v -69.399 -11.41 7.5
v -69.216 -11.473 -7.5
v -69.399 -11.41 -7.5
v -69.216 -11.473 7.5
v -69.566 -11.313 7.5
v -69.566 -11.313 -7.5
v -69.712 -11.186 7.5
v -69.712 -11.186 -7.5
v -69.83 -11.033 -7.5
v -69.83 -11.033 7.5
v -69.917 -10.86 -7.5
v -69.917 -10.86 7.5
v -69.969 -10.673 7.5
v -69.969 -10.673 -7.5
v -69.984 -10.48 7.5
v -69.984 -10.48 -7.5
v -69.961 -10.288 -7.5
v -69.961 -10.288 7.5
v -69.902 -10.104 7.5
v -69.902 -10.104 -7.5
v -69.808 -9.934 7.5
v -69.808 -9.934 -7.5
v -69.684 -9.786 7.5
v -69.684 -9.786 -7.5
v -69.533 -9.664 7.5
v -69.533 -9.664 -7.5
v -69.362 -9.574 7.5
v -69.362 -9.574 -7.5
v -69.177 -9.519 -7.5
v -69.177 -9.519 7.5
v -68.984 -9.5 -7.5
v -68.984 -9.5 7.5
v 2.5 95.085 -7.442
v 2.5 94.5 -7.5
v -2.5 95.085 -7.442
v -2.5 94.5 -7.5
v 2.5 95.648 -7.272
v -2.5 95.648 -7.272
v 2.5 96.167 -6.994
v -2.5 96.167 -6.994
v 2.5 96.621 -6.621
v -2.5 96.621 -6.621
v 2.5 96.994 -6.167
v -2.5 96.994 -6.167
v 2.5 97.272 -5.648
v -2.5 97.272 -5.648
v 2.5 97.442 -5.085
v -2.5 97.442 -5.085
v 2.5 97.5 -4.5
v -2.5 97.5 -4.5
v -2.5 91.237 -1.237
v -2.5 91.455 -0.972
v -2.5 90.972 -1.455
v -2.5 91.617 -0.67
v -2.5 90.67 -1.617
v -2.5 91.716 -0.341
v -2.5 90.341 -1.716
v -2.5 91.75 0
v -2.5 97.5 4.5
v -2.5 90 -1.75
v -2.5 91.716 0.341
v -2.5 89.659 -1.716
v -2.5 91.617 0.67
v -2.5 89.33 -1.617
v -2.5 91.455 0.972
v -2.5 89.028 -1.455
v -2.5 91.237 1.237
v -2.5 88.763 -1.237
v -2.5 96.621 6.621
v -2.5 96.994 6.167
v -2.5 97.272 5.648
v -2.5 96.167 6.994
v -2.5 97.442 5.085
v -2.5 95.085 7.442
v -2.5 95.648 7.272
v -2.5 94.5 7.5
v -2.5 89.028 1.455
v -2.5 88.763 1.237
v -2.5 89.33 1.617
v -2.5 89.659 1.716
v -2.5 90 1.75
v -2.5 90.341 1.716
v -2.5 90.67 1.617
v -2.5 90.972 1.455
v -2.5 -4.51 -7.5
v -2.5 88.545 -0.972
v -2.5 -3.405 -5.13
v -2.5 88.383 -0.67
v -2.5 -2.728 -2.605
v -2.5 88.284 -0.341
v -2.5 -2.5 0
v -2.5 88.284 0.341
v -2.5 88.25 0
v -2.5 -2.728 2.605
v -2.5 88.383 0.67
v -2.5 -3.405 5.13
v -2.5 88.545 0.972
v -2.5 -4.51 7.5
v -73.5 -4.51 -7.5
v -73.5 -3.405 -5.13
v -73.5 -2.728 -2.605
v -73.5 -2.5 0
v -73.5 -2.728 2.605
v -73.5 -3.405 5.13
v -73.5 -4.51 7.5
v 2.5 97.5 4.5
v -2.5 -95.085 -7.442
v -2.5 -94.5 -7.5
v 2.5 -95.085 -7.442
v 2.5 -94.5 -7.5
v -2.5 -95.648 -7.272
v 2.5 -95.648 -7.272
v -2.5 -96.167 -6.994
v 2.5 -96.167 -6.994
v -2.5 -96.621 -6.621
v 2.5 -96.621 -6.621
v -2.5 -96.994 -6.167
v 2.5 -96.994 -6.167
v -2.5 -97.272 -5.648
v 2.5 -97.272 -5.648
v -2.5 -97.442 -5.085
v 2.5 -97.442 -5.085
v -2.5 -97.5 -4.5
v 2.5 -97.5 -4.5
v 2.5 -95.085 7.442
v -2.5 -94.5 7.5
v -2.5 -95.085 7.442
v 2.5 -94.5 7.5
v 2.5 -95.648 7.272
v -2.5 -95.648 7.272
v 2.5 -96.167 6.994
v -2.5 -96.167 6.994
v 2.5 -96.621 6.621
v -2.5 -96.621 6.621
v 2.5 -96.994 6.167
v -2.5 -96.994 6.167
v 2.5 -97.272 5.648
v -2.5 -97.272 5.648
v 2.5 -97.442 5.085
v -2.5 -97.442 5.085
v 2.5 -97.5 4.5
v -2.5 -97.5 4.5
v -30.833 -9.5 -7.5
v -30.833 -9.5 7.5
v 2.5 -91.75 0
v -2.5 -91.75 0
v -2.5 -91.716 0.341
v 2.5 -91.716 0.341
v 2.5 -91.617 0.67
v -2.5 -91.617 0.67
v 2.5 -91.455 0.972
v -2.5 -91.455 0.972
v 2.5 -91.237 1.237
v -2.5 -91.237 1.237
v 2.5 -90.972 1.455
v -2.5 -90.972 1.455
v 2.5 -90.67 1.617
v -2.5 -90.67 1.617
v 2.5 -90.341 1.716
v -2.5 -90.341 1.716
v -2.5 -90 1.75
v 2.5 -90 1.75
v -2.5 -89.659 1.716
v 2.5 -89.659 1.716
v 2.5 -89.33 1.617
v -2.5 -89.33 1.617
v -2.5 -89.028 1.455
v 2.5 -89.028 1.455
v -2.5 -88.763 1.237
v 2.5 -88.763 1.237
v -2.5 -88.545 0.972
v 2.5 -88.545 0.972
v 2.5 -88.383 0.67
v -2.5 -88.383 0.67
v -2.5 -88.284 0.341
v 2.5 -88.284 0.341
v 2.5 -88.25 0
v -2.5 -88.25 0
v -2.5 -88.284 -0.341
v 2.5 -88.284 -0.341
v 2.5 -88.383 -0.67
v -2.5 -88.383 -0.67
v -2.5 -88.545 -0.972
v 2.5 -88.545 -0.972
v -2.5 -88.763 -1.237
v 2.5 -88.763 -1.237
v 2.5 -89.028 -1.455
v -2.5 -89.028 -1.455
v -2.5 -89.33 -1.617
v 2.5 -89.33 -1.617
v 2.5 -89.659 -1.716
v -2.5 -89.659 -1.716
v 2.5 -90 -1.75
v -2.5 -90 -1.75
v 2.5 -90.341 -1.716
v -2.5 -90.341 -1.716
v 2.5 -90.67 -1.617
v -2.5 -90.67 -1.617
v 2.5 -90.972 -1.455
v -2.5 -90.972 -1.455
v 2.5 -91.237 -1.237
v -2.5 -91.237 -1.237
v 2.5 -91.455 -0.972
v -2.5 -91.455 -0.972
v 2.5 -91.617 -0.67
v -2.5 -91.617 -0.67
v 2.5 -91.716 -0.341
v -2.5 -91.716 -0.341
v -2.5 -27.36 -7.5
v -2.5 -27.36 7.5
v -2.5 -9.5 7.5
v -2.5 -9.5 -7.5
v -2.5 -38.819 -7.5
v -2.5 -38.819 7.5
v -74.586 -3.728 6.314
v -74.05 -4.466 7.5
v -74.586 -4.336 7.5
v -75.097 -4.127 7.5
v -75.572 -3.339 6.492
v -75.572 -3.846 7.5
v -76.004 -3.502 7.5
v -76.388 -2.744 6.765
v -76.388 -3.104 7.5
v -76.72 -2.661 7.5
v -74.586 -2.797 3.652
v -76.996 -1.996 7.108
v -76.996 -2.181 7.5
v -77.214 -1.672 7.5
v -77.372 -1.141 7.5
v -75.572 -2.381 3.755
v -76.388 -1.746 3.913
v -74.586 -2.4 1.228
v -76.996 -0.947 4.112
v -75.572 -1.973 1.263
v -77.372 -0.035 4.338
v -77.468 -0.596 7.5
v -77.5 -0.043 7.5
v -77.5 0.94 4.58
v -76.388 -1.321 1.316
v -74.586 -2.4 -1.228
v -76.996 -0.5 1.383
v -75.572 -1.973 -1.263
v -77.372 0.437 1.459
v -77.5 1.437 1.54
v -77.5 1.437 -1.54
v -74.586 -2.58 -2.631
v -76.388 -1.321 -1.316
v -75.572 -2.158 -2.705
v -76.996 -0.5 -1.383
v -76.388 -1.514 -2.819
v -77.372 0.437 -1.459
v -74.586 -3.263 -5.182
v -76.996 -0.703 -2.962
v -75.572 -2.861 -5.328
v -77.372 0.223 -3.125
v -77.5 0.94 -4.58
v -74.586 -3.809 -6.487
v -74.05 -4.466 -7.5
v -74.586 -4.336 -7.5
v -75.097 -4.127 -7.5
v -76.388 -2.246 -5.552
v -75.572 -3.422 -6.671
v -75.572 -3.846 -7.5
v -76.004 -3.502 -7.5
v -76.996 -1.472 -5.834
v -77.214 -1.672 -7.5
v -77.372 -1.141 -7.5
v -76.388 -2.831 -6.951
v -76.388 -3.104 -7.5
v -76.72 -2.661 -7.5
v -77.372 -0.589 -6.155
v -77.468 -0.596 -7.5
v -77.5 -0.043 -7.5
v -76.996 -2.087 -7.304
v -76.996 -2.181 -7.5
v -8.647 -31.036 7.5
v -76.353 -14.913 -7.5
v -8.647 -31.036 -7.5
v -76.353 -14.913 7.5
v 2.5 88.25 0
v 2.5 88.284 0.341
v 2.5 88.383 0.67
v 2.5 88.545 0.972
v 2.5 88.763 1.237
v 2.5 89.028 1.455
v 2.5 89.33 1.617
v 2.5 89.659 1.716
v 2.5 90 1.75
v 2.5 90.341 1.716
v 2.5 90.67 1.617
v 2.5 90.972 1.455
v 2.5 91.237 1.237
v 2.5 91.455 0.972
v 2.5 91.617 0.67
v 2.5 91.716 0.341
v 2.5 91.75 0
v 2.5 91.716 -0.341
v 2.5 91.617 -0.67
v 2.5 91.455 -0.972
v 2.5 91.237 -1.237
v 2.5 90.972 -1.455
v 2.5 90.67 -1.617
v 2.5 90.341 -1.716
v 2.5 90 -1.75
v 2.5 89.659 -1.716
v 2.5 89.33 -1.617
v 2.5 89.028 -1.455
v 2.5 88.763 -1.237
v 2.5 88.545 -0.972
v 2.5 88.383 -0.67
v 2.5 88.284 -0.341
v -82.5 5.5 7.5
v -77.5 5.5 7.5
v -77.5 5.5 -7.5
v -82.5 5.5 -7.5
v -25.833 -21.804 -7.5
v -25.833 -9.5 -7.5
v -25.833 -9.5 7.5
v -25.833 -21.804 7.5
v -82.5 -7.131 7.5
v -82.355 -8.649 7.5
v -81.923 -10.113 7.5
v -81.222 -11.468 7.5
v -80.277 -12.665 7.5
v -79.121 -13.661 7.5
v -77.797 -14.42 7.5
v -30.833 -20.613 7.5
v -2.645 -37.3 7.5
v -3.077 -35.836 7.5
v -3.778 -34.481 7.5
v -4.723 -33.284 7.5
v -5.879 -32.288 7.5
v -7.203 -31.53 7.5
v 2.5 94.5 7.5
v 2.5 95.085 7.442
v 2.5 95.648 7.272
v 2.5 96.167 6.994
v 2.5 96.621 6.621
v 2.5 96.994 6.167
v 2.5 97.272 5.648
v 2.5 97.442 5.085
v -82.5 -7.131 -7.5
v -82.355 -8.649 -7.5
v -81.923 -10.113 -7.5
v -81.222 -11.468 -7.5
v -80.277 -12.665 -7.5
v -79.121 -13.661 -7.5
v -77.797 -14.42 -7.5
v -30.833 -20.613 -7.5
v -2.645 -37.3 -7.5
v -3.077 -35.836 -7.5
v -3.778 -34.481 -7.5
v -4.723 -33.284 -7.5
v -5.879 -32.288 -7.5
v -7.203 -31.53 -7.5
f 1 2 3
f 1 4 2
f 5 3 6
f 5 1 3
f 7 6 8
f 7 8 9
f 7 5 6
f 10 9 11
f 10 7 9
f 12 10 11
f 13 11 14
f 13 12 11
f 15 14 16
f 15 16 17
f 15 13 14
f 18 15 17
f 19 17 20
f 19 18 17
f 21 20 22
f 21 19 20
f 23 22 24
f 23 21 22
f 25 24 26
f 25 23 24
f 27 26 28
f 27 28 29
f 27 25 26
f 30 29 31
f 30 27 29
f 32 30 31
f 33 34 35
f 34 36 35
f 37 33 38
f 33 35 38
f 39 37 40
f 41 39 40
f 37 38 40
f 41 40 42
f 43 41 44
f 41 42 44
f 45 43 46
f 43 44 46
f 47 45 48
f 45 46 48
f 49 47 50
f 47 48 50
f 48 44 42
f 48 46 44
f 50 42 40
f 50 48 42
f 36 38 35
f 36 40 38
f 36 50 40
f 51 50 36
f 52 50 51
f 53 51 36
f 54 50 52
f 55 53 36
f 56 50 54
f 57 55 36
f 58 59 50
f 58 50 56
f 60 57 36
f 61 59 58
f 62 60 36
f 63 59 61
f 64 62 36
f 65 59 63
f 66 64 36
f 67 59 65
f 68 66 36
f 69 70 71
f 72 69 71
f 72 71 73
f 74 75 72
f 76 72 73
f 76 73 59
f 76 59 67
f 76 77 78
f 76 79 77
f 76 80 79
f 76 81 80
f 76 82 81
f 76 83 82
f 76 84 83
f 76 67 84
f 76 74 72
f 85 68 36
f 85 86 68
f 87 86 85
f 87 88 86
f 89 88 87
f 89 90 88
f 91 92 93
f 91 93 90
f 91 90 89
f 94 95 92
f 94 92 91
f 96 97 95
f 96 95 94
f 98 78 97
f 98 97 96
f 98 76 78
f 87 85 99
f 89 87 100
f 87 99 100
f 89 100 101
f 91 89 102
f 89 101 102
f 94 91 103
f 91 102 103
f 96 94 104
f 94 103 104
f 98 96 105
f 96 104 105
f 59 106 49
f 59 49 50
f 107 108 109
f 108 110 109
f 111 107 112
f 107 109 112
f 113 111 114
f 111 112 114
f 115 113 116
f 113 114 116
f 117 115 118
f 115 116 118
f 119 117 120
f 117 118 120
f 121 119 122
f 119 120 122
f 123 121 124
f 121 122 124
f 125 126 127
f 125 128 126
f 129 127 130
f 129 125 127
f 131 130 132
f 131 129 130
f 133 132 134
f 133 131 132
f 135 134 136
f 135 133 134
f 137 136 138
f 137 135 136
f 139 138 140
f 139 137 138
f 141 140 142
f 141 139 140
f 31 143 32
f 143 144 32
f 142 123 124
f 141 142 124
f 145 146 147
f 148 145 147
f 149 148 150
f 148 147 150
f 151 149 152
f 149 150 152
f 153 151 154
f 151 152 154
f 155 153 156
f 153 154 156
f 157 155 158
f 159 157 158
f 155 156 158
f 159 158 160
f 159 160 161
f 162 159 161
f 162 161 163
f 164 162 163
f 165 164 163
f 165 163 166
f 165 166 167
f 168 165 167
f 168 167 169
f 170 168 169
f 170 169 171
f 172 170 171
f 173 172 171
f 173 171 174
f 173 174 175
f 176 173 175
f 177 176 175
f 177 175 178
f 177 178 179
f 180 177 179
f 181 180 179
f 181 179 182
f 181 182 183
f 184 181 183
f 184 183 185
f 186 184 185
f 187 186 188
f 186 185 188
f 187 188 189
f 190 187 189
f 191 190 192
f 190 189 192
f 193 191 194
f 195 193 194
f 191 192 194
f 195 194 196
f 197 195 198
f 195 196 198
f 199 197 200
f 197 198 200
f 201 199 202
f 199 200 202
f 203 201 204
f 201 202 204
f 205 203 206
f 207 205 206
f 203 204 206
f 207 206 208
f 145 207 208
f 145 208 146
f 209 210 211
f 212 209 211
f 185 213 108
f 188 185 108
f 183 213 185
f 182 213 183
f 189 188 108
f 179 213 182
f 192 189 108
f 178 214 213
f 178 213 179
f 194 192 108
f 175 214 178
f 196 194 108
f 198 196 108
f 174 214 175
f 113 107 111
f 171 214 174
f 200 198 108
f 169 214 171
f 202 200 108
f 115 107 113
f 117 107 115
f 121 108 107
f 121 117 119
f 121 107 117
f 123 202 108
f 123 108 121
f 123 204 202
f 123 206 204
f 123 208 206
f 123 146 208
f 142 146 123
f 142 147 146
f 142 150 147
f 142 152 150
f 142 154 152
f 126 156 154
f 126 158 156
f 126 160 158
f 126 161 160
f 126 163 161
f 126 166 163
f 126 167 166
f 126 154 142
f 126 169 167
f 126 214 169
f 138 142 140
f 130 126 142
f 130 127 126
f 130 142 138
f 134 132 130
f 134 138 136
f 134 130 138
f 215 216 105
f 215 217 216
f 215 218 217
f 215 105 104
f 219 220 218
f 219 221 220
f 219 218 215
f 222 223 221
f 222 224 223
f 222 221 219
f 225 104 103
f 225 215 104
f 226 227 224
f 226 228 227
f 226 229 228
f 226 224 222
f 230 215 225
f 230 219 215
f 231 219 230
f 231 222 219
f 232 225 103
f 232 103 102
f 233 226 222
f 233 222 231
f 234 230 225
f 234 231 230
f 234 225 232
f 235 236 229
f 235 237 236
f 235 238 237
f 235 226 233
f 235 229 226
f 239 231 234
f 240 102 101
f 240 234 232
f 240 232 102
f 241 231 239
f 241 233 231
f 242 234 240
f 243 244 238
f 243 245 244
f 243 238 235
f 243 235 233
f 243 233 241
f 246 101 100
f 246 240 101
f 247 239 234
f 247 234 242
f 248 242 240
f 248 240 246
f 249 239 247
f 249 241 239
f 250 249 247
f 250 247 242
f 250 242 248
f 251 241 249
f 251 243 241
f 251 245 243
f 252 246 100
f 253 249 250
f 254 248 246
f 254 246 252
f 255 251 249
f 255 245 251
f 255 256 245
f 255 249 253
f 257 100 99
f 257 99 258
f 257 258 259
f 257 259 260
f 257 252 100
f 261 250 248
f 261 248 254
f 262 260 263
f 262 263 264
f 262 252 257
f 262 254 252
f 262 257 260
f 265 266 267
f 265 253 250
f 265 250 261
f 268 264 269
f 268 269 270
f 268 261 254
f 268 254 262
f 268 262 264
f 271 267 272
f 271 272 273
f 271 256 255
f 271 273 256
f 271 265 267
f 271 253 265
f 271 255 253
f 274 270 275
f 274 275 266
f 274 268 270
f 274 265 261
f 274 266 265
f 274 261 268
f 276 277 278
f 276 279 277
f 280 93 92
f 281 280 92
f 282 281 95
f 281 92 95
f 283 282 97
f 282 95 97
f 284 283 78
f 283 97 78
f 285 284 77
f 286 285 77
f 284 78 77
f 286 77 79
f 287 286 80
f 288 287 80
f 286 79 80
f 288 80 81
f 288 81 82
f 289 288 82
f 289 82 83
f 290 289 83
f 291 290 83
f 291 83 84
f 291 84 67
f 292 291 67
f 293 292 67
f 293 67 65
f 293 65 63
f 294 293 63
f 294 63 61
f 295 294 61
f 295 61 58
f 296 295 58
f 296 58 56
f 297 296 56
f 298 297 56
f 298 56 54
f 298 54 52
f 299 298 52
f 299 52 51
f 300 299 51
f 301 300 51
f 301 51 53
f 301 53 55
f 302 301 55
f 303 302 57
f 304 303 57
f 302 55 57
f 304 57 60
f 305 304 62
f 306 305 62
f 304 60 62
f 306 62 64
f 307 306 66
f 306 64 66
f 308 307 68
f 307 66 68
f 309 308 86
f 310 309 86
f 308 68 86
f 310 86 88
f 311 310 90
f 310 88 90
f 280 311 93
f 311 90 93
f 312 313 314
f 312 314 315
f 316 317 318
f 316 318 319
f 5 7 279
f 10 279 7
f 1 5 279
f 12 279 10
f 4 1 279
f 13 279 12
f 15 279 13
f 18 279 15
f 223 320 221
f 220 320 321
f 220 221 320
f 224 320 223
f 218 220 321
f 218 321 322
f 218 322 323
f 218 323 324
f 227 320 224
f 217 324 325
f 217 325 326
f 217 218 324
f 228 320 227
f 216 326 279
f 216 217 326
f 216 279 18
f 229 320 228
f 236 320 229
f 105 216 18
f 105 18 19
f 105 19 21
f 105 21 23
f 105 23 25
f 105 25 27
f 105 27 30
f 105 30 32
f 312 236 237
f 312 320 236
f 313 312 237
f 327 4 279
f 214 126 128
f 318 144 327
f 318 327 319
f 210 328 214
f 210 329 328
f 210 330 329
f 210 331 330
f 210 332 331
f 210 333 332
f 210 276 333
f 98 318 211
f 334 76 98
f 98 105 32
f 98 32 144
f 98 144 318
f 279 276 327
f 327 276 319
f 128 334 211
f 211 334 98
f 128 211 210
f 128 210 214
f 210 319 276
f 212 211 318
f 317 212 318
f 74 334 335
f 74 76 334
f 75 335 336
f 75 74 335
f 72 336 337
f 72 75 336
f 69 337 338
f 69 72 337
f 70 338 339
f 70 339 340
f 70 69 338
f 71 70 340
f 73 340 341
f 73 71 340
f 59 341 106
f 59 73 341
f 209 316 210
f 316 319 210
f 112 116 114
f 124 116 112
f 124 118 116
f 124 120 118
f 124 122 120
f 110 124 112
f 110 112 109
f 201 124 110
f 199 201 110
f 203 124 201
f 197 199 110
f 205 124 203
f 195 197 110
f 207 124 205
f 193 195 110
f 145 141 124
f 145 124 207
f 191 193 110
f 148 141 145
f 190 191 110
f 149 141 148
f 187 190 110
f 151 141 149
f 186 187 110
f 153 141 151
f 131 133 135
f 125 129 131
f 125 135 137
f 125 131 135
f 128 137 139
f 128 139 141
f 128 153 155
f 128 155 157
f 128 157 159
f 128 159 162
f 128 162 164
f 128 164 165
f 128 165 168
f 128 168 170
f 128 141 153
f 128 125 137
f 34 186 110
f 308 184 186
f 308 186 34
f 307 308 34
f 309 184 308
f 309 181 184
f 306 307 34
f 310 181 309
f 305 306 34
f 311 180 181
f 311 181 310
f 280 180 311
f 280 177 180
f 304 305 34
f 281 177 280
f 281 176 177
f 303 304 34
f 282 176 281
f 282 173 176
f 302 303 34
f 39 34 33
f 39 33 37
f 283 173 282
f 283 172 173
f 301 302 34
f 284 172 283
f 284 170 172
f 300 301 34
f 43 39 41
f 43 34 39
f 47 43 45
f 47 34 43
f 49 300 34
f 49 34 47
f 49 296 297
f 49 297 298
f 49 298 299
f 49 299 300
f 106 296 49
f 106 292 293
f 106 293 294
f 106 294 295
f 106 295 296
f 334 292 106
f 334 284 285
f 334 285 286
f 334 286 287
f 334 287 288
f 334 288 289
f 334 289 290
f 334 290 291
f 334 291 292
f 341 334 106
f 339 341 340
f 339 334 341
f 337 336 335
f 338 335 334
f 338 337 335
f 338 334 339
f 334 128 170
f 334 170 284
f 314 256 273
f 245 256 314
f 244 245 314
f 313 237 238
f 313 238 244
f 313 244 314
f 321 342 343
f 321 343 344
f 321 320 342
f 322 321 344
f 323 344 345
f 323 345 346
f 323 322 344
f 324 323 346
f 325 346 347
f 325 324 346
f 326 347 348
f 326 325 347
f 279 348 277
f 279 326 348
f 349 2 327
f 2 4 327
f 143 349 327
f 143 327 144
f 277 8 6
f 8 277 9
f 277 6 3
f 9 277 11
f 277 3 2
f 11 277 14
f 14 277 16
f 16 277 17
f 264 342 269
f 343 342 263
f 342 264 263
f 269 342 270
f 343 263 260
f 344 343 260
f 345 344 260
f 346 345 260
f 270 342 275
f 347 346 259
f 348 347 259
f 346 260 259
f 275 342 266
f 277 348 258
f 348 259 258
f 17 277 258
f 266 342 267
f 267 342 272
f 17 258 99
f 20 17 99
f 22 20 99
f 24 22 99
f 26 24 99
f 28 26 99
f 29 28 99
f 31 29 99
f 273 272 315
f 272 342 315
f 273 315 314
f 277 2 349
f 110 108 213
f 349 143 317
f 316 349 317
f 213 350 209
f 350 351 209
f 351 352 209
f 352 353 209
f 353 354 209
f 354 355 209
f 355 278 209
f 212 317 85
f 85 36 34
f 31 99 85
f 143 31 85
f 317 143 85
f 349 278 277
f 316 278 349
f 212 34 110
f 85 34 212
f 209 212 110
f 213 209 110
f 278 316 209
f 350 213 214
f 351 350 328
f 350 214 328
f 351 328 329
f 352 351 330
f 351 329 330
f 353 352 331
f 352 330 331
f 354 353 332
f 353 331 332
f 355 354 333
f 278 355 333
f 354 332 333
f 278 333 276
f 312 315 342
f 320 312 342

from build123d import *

# Parameters (mm, degrees)
RESSALTO_EXTRUS_O1_DEPTH = 7.5
ESBO_O2_R                = 1.7500000000000029
CORTE_EXTRUS_O1_DEPTH    = 10
FILETE1_R                = 1
CORTE_EXTRUS_O2_START    = -5
CORTE_EXTRUS_O2_DEPTH    = 75
FILETE2_R                = 3
FILETE3_R                = 8
FILETE4_R                = 4


with BuildPart() as part:
    # Esboço1 → Ressalto-extrusão1 (new, symmetric)
    with BuildSketch(Plane.XY):
        Polygon((-2.4999999999999947, -2.5000000000002314), (-77.5, -2.5000000000002305), (-77.5, 5.499999999999769), (-82.5, 5.499999999999769), (-82.5, -2.5000000000002314), (-82.5, -13.4491378645859), (-2.499999999999993, -32.50000000000023), (-2.499999999999994, -97.5000000000002), (2.500000000000006, -97.50000000000021), (2.4999999999999813, 97.4999999999998), (-2.4999999999999933, 97.4999999999998), align=None)
        Polygon((-2.4999999999999947, -9.500000000000231), (-25.833333333333332, -9.500000000000231), (-25.833333333333332, -21.80368179578865), (-2.499999999999992, -27.360183251951156), align=None, mode=Mode.SUBTRACT)
        Polygon((-77.5, -9.500000000000231), (-30.83333333333334, -20.613002912325253), (-30.833333333333336, -9.500000000000231), align=None, mode=Mode.SUBTRACT)
    extrude(amount=RESSALTO_EXTRUS_O1_DEPTH, both=True)

    # Esboço2 → Corte-extrusão1 (cut)
    with BuildSketch(Plane.ZY.offset(2.4999999999999947)):
        with Locations(Location((0, 90, 0), (0, 0, 270))):
            Circle(ESBO_O2_R)
        with Locations(Location((0, -90, 0), (0, 0, 270))):
            Circle(ESBO_O2_R)
    extrude(amount=-CORTE_EXTRUS_O1_DEPTH, mode=Mode.SUBTRACT)

    # Filete1
    filete1_edges = [part.edges().sort_by_distance(p)[0] for p in [
        (-77.5, -9.500000000000231, 0),
    ]]
    fillet(filete1_edges, radius=FILETE1_R)

    # Esboço3 → Corte-extrusão2 (cut)
    with BuildSketch(Plane.ZY.offset(82.5).offset(CORTE_EXTRUS_O2_START)):
        with BuildLine():
            Line((7.5, -4.5096189432336615), (7.5, -2.5000000000002363))
            Line((7.5, -2.5000000000002363), (0, -2.5000000000002363))
            ThreePointArc((-4.4e-16, -2.50000000000024), (3.8822856765378098, -3.0111126056642163), (7.500000000000002, -4.509618943233658))
        make_face()
        with BuildLine():
            ThreePointArc((-7.500000000000002, -4.509618943233658), (-3.8822856765378124, -3.0111126056642163), (-4.4e-16, -2.50000000000024))
            Line((0, -2.5000000000002363), (-7.5, -2.5000000000002363))
            Line((-7.5, -2.5000000000002363), (-7.5, -4.5096189432336615))
        make_face()
    extrude(amount=-CORTE_EXTRUS_O2_DEPTH, mode=Mode.SUBTRACT)

    # Filete2
    filete2_edges = [part.edges().sort_by_distance(p)[0] for p in [
        (-6.22e-15, 97.4999999999998, -7.5),
        (6.22e-15, -97.5000000000002, -7.5),
        (-6.22e-15, 97.4999999999998, 7.5),
        (6.22e-15, -97.5000000000002, 7.5),
    ]]
    fillet(filete2_edges, radius=FILETE2_R)

    # Filete3
    filete3_edges = [part.edges().sort_by_distance(p)[0] for p in [
        (-2.499999999999993, -32.50000000000023, 0),
        (-82.5, -13.4491378645859, 0),
    ]]
    fillet(filete3_edges, radius=FILETE3_R)

    # Filete4
    filete4_edges = [part.edges().sort_by_distance(p)[0] for p in [
        (-77.5, -2.5000000000002327, -1.44e-15),
    ]]
    fillet(filete4_edges, radius=FILETE4_R)


solid = part.part
